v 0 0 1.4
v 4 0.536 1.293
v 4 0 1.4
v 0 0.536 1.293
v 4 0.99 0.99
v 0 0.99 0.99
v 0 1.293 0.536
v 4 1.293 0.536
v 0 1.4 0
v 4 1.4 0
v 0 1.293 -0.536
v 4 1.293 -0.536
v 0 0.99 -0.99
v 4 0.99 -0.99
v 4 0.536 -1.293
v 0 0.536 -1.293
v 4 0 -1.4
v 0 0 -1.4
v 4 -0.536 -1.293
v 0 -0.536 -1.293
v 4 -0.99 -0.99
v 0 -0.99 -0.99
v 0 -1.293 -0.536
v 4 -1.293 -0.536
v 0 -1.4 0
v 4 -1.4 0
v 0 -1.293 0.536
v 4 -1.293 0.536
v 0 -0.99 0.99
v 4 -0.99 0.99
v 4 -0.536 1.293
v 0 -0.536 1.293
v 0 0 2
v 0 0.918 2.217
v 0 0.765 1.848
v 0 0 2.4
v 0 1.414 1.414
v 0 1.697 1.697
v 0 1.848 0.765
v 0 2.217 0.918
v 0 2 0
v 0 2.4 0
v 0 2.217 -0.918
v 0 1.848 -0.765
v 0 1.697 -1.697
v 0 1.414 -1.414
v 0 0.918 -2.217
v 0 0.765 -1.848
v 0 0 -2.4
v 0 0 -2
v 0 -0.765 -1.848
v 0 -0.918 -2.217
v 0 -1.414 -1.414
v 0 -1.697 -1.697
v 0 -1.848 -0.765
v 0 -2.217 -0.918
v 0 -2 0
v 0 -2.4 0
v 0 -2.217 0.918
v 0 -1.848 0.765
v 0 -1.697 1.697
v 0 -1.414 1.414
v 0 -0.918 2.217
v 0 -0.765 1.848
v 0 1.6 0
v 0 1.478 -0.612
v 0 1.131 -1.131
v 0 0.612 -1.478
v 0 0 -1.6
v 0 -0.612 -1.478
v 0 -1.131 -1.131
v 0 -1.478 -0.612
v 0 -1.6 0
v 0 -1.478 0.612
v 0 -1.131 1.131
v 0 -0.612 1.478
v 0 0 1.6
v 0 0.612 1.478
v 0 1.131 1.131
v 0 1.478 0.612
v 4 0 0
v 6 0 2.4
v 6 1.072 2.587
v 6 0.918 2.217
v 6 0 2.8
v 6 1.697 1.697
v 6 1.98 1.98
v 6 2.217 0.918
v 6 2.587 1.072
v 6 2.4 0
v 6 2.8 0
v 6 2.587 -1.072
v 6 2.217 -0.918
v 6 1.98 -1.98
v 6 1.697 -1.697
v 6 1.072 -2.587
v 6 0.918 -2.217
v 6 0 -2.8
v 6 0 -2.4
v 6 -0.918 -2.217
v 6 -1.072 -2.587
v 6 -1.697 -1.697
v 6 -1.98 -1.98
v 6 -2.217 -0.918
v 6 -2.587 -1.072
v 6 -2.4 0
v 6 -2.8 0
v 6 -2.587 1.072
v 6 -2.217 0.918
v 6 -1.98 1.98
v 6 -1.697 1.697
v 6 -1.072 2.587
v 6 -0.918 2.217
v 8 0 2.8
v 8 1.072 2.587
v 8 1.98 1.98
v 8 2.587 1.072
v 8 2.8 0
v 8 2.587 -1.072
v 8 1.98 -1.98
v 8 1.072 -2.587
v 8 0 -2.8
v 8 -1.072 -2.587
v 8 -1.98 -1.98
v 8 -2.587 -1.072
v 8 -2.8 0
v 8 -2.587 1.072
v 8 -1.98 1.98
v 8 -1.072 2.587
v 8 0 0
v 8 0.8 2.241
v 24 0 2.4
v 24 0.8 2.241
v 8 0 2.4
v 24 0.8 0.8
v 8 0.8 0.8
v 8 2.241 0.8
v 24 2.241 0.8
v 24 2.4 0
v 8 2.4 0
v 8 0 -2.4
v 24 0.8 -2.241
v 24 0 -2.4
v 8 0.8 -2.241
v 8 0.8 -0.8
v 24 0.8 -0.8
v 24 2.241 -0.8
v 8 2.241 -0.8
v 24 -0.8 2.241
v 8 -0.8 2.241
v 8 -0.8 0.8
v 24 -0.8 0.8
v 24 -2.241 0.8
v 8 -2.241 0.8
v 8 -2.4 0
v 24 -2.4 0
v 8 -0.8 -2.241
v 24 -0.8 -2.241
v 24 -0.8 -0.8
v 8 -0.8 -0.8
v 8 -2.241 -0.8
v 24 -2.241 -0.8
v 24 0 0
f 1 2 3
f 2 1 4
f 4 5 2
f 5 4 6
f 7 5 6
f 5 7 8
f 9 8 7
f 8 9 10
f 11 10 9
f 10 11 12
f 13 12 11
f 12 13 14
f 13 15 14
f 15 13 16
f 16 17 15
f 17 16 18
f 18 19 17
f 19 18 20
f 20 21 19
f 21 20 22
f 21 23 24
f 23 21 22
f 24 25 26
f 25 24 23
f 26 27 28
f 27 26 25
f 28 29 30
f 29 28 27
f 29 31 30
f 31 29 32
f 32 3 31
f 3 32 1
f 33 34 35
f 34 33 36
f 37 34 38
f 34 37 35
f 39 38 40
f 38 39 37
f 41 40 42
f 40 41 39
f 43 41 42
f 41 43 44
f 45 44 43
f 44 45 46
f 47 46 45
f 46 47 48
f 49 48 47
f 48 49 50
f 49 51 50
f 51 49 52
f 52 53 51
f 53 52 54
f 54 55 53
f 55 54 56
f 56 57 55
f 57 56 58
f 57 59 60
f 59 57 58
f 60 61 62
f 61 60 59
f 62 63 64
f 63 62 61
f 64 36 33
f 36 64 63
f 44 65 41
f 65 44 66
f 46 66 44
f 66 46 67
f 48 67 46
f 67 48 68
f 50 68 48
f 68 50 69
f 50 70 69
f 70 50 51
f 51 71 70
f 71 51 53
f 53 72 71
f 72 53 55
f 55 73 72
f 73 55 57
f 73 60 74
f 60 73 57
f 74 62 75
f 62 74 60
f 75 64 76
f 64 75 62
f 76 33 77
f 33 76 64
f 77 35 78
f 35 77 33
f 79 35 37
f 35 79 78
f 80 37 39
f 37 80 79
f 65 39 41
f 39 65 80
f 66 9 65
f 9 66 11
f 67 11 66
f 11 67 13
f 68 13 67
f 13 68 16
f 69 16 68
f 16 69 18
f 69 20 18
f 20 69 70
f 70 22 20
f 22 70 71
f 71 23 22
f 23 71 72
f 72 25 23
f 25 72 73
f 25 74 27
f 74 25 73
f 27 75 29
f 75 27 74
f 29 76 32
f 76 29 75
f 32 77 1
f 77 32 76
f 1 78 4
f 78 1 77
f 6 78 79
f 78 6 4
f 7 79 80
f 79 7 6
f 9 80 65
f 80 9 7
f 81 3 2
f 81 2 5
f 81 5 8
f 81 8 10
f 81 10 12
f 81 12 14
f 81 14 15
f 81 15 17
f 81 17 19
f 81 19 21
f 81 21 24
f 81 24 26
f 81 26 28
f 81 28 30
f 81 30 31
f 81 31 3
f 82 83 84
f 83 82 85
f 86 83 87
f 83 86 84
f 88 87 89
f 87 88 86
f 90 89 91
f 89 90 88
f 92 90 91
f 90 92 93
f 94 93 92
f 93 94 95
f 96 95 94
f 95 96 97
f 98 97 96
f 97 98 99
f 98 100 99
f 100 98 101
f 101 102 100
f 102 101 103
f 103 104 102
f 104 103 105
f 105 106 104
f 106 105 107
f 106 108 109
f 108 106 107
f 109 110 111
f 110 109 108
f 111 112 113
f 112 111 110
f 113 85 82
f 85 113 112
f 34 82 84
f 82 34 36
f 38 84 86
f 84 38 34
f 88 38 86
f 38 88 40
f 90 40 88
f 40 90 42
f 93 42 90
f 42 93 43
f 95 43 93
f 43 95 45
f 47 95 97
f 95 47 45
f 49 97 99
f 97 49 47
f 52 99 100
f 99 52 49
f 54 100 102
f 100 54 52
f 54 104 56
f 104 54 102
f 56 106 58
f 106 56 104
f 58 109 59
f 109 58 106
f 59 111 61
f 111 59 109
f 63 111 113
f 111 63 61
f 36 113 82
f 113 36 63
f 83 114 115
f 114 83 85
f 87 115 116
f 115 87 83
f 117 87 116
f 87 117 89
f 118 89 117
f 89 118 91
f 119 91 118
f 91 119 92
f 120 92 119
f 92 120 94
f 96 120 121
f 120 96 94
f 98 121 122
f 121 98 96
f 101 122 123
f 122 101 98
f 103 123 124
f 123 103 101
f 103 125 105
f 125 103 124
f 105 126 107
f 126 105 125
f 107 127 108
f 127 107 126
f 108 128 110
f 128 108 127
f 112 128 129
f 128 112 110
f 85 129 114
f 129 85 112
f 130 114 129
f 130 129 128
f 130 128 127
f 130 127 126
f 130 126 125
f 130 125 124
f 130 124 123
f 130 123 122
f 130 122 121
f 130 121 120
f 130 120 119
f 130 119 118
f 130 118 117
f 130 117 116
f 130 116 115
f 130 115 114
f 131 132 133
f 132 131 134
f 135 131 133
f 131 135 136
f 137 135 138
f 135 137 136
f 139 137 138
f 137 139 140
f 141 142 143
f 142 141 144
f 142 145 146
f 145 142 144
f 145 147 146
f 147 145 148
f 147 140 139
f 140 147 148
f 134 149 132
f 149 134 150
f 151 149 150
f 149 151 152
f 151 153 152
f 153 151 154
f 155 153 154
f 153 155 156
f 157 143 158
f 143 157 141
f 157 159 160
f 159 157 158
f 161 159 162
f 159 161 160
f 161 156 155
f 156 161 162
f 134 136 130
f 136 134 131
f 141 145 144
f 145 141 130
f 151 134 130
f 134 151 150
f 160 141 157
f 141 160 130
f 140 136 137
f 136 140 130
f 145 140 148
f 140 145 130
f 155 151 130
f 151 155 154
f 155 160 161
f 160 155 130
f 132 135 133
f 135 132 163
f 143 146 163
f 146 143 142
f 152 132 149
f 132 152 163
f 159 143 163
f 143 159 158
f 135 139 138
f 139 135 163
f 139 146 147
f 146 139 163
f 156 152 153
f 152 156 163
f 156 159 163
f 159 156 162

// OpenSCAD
// file: ../p/axle.scad
use <../lib.scad>
function ldraw_lib__axle() = [
// 0 Axle
// 0 Name: axle.dat
// 0 Author: James Jessiman
// 0 !LDRAW_ORG Primitive UPDATE 2003-01
// 0 !LICENSE Licensed under CC BY 4.0 : see CAreadme.txt
// 
// 0 BFC CERTIFY CCW
  [0,"BFC","CERTIFY"],
  [0,"BFC","CCW"],
// 
// 0 !HISTORY 2000-04-23 [sbliss] Added conditional edges along outermost diameters
// 0 !HISTORY 2000-05-07 [PTadmin] Official Update 2000-01
// 0 !HISTORY 2002-11-08 [OrionP] Adjusted fit and precision
// 0 !HISTORY 2003-03-12 [PTadmin] Official Update 2003-01
// 0 !HISTORY 2007-06-24 [PTadmin] Header formatted for Contributor Agreement
// 0 !HISTORY 2008-07-01 [PTadmin] Official Update 2008-01
// 
// 
// 5 24 6 0 0 6 1 0 5.602 0 2 5.602 0 -2
  [5,24,6,0,0,6,1,0,5.602,0,2,5.602,0,-2],
// 5 24 0 0 6 0 1 6 2 0 5.602 -2 0 5.602
  [5,24,0,0,6,0,1,6,2,0,5.602,-2,0,5.602],
// 5 24 -6 0 0 -6 1 0 -5.602 0 -2 -5.602 0 2
  [5,24,-6,0,0,-6,1,0,-5.602,0,-2,-5.602,0,2],
// 5 24 0 0 -6 0 1 -6 -2 0 -5.602 2 0 -5.602
  [5,24,0,0,-6,0,1,-6,-2,0,-5.602,2,0,-5.602],
// 
// 2 24 6 0 0 5.602 0 2
  [2,24,6,0,0,5.602,0,2],
// 2 24 5.602 0 2 2 0 2
  [2,24,5.602,0,2,2,0,2],
// 2 24 2 0 2 2 0 5.602
  [2,24,2,0,2,2,0,5.602],
// 2 24 2 0 5.602 0 0 6
  [2,24,2,0,5.602,0,0,6],
// 2 24 -6 0 0 -5.602 0 2
  [2,24,-6,0,0,-5.602,0,2],
// 2 24 -5.602 0 2 -2 0 2
  [2,24,-5.602,0,2,-2,0,2],
// 2 24 -2 0 2 -2 0 5.602
  [2,24,-2,0,2,-2,0,5.602],
// 2 24 -2 0 5.602 -0 0 6
  [2,24,-2,0,5.602,-0,0,6],
// 2 24 6 0 -0 5.602 0 -2
  [2,24,6,0,-0,5.602,0,-2],
// 2 24 5.602 0 -2 2 0 -2
  [2,24,5.602,0,-2,2,0,-2],
// 2 24 2 0 -2 2 0 -5.602
  [2,24,2,0,-2,2,0,-5.602],
// 2 24 2 0 -5.602 0 0 -6
  [2,24,2,0,-5.602,0,0,-6],
// 2 24 -6 0 -0 -5.602 0 -2
  [2,24,-6,0,-0,-5.602,0,-2],
// 2 24 -5.602 0 -2 -2 0 -2
  [2,24,-5.602,0,-2,-2,0,-2],
// 2 24 -2 0 -2 -2 0 -5.602
  [2,24,-2,0,-2,-2,0,-5.602],
// 2 24 -2 0 -5.602 -0 0 -6
  [2,24,-2,0,-5.602,-0,0,-6],
// 2 24 6 1 0 5.602 1 2
  [2,24,6,1,0,5.602,1,2],
// 2 24 5.602 1 2 2 1 2
  [2,24,5.602,1,2,2,1,2],
// 2 24 2 1 2 2 1 5.602
  [2,24,2,1,2,2,1,5.602],
// 2 24 2 1 5.602 0 1 6
  [2,24,2,1,5.602,0,1,6],
// 2 24 -6 1 0 -5.602 1 2
  [2,24,-6,1,0,-5.602,1,2],
// 2 24 -5.602 1 2 -2 1 2
  [2,24,-5.602,1,2,-2,1,2],
// 2 24 -2 1 2 -2 1 5.602
  [2,24,-2,1,2,-2,1,5.602],
// 2 24 -2 1 5.602 -0 1 6
  [2,24,-2,1,5.602,-0,1,6],
// 2 24 6 1 -0 5.602 1 -2
  [2,24,6,1,-0,5.602,1,-2],
// 2 24 5.602 1 -2 2 1 -2
  [2,24,5.602,1,-2,2,1,-2],
// 2 24 2 1 -2 2 1 -5.602
  [2,24,2,1,-2,2,1,-5.602],
// 2 24 2 1 -5.602 0 1 -6
  [2,24,2,1,-5.602,0,1,-6],
// 2 24 -6 1 -0 -5.602 1 -2
  [2,24,-6,1,-0,-5.602,1,-2],
// 2 24 -5.602 1 -2 -2 1 -2
  [2,24,-5.602,1,-2,-2,1,-2],
// 2 24 -2 1 -2 -2 1 -5.602
  [2,24,-2,1,-2,-2,1,-5.602],
// 2 24 -2 1 -5.602 -0 1 -6
  [2,24,-2,1,-5.602,-0,1,-6],
// 
// 2 24 5.602 0 2 5.602 1 2
  [2,24,5.602,0,2,5.602,1,2],
// 2 24 2 0 2 2 1 2
  [2,24,2,0,2,2,1,2],
// 2 24 2 0 5.602 2 1 5.602
  [2,24,2,0,5.602,2,1,5.602],
// 2 24 -5.602 0 2 -5.602 1 2
  [2,24,-5.602,0,2,-5.602,1,2],
// 2 24 -2 0 2 -2 1 2
  [2,24,-2,0,2,-2,1,2],
// 2 24 -2 0 5.602 -2 1 5.602
  [2,24,-2,0,5.602,-2,1,5.602],
// 2 24 5.602 0 -2 5.602 1 -2
  [2,24,5.602,0,-2,5.602,1,-2],
// 2 24 2 0 -2 2 1 -2
  [2,24,2,0,-2,2,1,-2],
// 2 24 2 0 -5.602 2 1 -5.602
  [2,24,2,0,-5.602,2,1,-5.602],
// 2 24 -5.602 0 -2 -5.602 1 -2
  [2,24,-5.602,0,-2,-5.602,1,-2],
// 2 24 -2 0 -2 -2 1 -2
  [2,24,-2,0,-2,-2,1,-2],
// 2 24 -2 0 -5.602 -2 1 -5.602
  [2,24,-2,0,-5.602,-2,1,-5.602],
// 
// 4 16 6 0 0 6 1 0 5.602 1 2 5.602 0 2
  [4,16,6,0,0,6,1,0,5.602,1,2,5.602,0,2],
// 4 16 5.602 0 2 5.602 1 2 2 1 2 2 0 2
  [4,16,5.602,0,2,5.602,1,2,2,1,2,2,0,2],
// 4 16 2 0 2 2 1 2 2 1 5.602 2 0 5.602
  [4,16,2,0,2,2,1,2,2,1,5.602,2,0,5.602],
// 4 16 2 0 5.602 2 1 5.602 0 1 6 0 0 6
  [4,16,2,0,5.602,2,1,5.602,0,1,6,0,0,6],
// 4 16 -6 0 0 -5.602 0 2 -5.602 1 2 -6 1 0
  [4,16,-6,0,0,-5.602,0,2,-5.602,1,2,-6,1,0],
// 4 16 -5.602 0 2 -2 0 2 -2 1 2 -5.602 1 2
  [4,16,-5.602,0,2,-2,0,2,-2,1,2,-5.602,1,2],
// 4 16 -2 0 2 -2 0 5.602 -2 1 5.602 -2 1 2
  [4,16,-2,0,2,-2,0,5.602,-2,1,5.602,-2,1,2],
// 4 16 -2 0 5.602 -0 0 6 -0 1 6 -2 1 5.602
  [4,16,-2,0,5.602,-0,0,6,-0,1,6,-2,1,5.602],
// 4 16 6 0 -0 5.602 0 -2 5.602 1 -2 6 1 -0
  [4,16,6,0,-0,5.602,0,-2,5.602,1,-2,6,1,-0],
// 4 16 5.602 0 -2 2 0 -2 2 1 -2 5.602 1 -2
  [4,16,5.602,0,-2,2,0,-2,2,1,-2,5.602,1,-2],
// 4 16 2 0 -2 2 0 -5.602 2 1 -5.602 2 1 -2
  [4,16,2,0,-2,2,0,-5.602,2,1,-5.602,2,1,-2],
// 4 16 2 0 -5.602 0 0 -6 0 1 -6 2 1 -5.602
  [4,16,2,0,-5.602,0,0,-6,0,1,-6,2,1,-5.602],
// 4 16 -6 0 -0 -6 1 -0 -5.602 1 -2 -5.602 0 -2
  [4,16,-6,0,-0,-6,1,-0,-5.602,1,-2,-5.602,0,-2],
// 4 16 -5.602 0 -2 -5.602 1 -2 -2 1 -2 -2 0 -2
  [4,16,-5.602,0,-2,-5.602,1,-2,-2,1,-2,-2,0,-2],
// 4 16 -2 0 -2 -2 1 -2 -2 1 -5.602 -2 0 -5.602
  [4,16,-2,0,-2,-2,1,-2,-2,1,-5.602,-2,0,-5.602],
// 4 16 -2 0 -5.602 -2 1 -5.602 -0 1 -6 -0 0 -6
  [4,16,-2,0,-5.602,-2,1,-5.602,-0,1,-6,-0,0,-6],
// 
// 4 16 6 0 0 5.602 0 2 2 0 2 0 0 0
  [4,16,6,0,0,5.602,0,2,2,0,2,0,0,0],
// 4 16 -6 0 0 0 0 0 -2 0 2 -5.602 0 2
  [4,16,-6,0,0,0,0,0,-2,0,2,-5.602,0,2],
// 4 16 6 0 0 0 0 0 2 0 -2 5.602 0 -2
  [4,16,6,0,0,0,0,0,2,0,-2,5.602,0,-2],
// 4 16 -6 0 0 -5.602 0 -2 -2 0 -2 0 0 0
  [4,16,-6,0,0,-5.602,0,-2,-2,0,-2,0,0,0],
// 4 16 0 0 6 0 0 0 2 0 2 2 0 5.602
  [4,16,0,0,6,0,0,0,2,0,2,2,0,5.602],
// 4 16 0 0 6 -2 0 5.602 -2 0 2 0 0 0
  [4,16,0,0,6,-2,0,5.602,-2,0,2,0,0,0],
// 4 16 0 0 -6 2 0 -5.602 2 0 -2 0 0 0
  [4,16,0,0,-6,2,0,-5.602,2,0,-2,0,0,0],
// 4 16 0 0 -6 0 0 0 -2 0 -2 -2 0 -5.602
  [4,16,0,0,-6,0,0,0,-2,0,-2,-2,0,-5.602],
// 4 16 6 1 0 0 1 0 2 1 2 5.602 1 2
  [4,16,6,1,0,0,1,0,2,1,2,5.602,1,2],
// 4 16 -6 1 0 -5.602 1 2 -2 1 2 0 1 0
  [4,16,-6,1,0,-5.602,1,2,-2,1,2,0,1,0],
// 4 16 6 1 0 5.602 1 -2 2 1 -2 0 1 0
  [4,16,6,1,0,5.602,1,-2,2,1,-2,0,1,0],
// 4 16 -6 1 0 0 1 0 -2 1 -2 -5.602 1 -2
  [4,16,-6,1,0,0,1,0,-2,1,-2,-5.602,1,-2],
// 4 16 0 1 6 2 1 5.602 2 1 2 0 1 0
  [4,16,0,1,6,2,1,5.602,2,1,2,0,1,0],
// 4 16 0 1 6 0 1 0 -2 1 2 -2 1 5.602
  [4,16,0,1,6,0,1,0,-2,1,2,-2,1,5.602],
// 4 16 0 1 -6 0 1 0 2 1 -2 2 1 -5.602
  [4,16,0,1,-6,0,1,0,2,1,-2,2,1,-5.602],
// 4 16 0 1 -6 -2 1 -5.602 -2 1 -2 0 1 0
  [4,16,0,1,-6,-2,1,-5.602,-2,1,-2,0,1,0],
// 0
];
module ldraw_lib__axle(step=0, col=false, unit=2/5, alt=false, line=0.2, solid=!$preview)
    makepoly(ldraw_lib__axle(), step=step, col=col, unit=unit, alt=alt, line=line, solid=solid);
ldraw_lib__axle(line=0.2);
// file: ../p/4-4ring7.scad
use <../lib.scad>
function ldraw_lib__4_4ring7() = [
// 0 Ring  7 x 1.0
// 0 Name: 4-4ring7.dat
// 0 Author: James Jessiman
// 0 !LDRAW_ORG Primitive UPDATE 2009-01
// 0 !LICENSE Licensed under CC BY 2.0 and CC BY 4.0 : see CAreadme.txt
// 
// 0 BFC CERTIFY CCW
  [0,"BFC","CERTIFY"],
  [0,"BFC","CCW"],
// 
// 0 !HISTORY 1998-12-15 [PTadmin] Official Update 1998-10
// 0 !HISTORY 2002-04-05 [hafhead] Added BFC statement
// 0 !HISTORY 2002-04-25 [PTadmin] Official Update 2002-02
// 0 !HISTORY 2007-06-24 [PTadmin] Header formatted for Contributor Agreement
// 0 !HISTORY 2008-07-01 [PTadmin] Official Update 2008-01
// 0 !HISTORY 2008-08-26 [cwdee] Switch polygon winding and rename
// 0 !HISTORY 2009-05-02 [PTadmin] Official Update 2009-01
// 
// 
// 4 16 -3.0616 0 7.3912 -2.6789 0 6.4673 0 0 7 0 0 8
  [4,16,-3.0616,0,7.3912,-2.6789,0,6.4673,0,0,7,0,0,8],
// 4 16 -5.6568 0 5.6568 -4.9497 0 4.9497 -2.6789 0 6.4673 -3.0616 0 7.3912
  [4,16,-5.6568,0,5.6568,-4.9497,0,4.9497,-2.6789,0,6.4673,-3.0616,0,7.3912],
// 4 16 -7.3912 0 3.0616 -6.4673 0 2.6789 -4.9497 0 4.9497 -5.6568 0 5.6568
  [4,16,-7.3912,0,3.0616,-6.4673,0,2.6789,-4.9497,0,4.9497,-5.6568,0,5.6568],
// 4 16 -8 0 0 -7 0 0 -6.4673 0 2.6789 -7.3912 0 3.0616
  [4,16,-8,0,0,-7,0,0,-6.4673,0,2.6789,-7.3912,0,3.0616],
// 4 16 -7.3912 0 -3.0616 -6.4673 0 -2.6789 -7 0 0 -8 0 0
  [4,16,-7.3912,0,-3.0616,-6.4673,0,-2.6789,-7,0,0,-8,0,0],
// 4 16 -5.6568 0 -5.6568 -4.9497 0 -4.9497 -6.4673 0 -2.6789 -7.3912 0 -3.0616
  [4,16,-5.6568,0,-5.6568,-4.9497,0,-4.9497,-6.4673,0,-2.6789,-7.3912,0,-3.0616],
// 4 16 -3.0616 0 -7.3912 -2.6789 0 -6.4673 -4.9497 0 -4.9497 -5.6568 0 -5.6568
  [4,16,-3.0616,0,-7.3912,-2.6789,0,-6.4673,-4.9497,0,-4.9497,-5.6568,0,-5.6568],
// 4 16 0 0 -8 0 0 -7 -2.6789 0 -6.4673 -3.0616 0 -7.3912
  [4,16,0,0,-8,0,0,-7,-2.6789,0,-6.4673,-3.0616,0,-7.3912],
// 4 16 3.0616 0 -7.3912 2.6789 0 -6.4673 0 0 -7 0 0 -8
  [4,16,3.0616,0,-7.3912,2.6789,0,-6.4673,0,0,-7,0,0,-8],
// 4 16 5.6568 0 -5.6568 4.9497 0 -4.9497 2.6789 0 -6.4673 3.0616 0 -7.3912
  [4,16,5.6568,0,-5.6568,4.9497,0,-4.9497,2.6789,0,-6.4673,3.0616,0,-7.3912],
// 4 16 7.3912 0 -3.0616 6.4673 0 -2.6789 4.9497 0 -4.9497 5.6568 0 -5.6568
  [4,16,7.3912,0,-3.0616,6.4673,0,-2.6789,4.9497,0,-4.9497,5.6568,0,-5.6568],
// 4 16 8 0 0 7 0 0 6.4673 0 -2.6789 7.3912 0 -3.0616
  [4,16,8,0,0,7,0,0,6.4673,0,-2.6789,7.3912,0,-3.0616],
// 4 16 7.3912 0 3.0616 6.4673 0 2.6789 7 0 0 8 0 0
  [4,16,7.3912,0,3.0616,6.4673,0,2.6789,7,0,0,8,0,0],
// 4 16 5.6568 0 5.6568 4.9497 0 4.9497 6.4673 0 2.6789 7.3912 0 3.0616
  [4,16,5.6568,0,5.6568,4.9497,0,4.9497,6.4673,0,2.6789,7.3912,0,3.0616],
// 4 16 3.0616 0 7.3912 2.6789 0 6.4673 4.9497 0 4.9497 5.6568 0 5.6568
  [4,16,3.0616,0,7.3912,2.6789,0,6.4673,4.9497,0,4.9497,5.6568,0,5.6568],
// 4 16 0 0 8 0 0 7 2.6789 0 6.4673 3.0616 0 7.3912
  [4,16,0,0,8,0,0,7,2.6789,0,6.4673,3.0616,0,7.3912],
// 0
];
module ldraw_lib__4_4ring7(step=0, col=false, unit=2/5, alt=false, line=0.2, solid=!$preview)
    makepoly(ldraw_lib__4_4ring7(), step=step, col=col, unit=unit, alt=alt, line=line, solid=solid);
ldraw_lib__4_4ring7(line=0.2);
// file: ../p/4-4ring6.scad
use <../lib.scad>
function ldraw_lib__4_4ring6() = [
// 0 Ring  6 x 1.0
// 0 Name: 4-4ring6.dat
// 0 Author: Mark Kennedy [mkennedy]
// 0 !LDRAW_ORG Primitive UPDATE 2012-01
// 0 !LICENSE Licensed under CC BY 4.0 : see CAreadme.txt
// 
// 0 BFC CERTIFY CCW
  [0,"BFC","CERTIFY"],
  [0,"BFC","CCW"],
// 
// 0 !HISTORY 2001-10-23 [pneaster] resequenced quads, corrected winding.
// 0 !HISTORY 2001-11-30 [PTadmin] Official Update 2001-02
// 0 !HISTORY 2007-06-24 [PTadmin] Header formatted for Contributor Agreement
// 0 !HISTORY 2008-07-01 [PTadmin] Official Update 2008-01
// 0 !HISTORY 2012-02-16 [Philo] Changed to CCW
// 0 !HISTORY 2012-03-30 [PTadmin] Official Update 2012-01
// 
// 
// 4 16 7 0 0 6.4672 0 2.6788 5.5433 0 2.2961 6 0 0
  [4,16,7,0,0,6.4672,0,2.6788,5.5433,0,2.2961,6,0,0],
// 4 16 6.4672 0 2.6788 4.9497 0 4.9497 4.2426 0 4.2426 5.5433 0 2.2961
  [4,16,6.4672,0,2.6788,4.9497,0,4.9497,4.2426,0,4.2426,5.5433,0,2.2961],
// 4 16 4.9497 0 4.9497 2.6788 0 6.4672 2.2961 0 5.5433 4.2426 0 4.2426
  [4,16,4.9497,0,4.9497,2.6788,0,6.4672,2.2961,0,5.5433,4.2426,0,4.2426],
// 4 16 2.6788 0 6.4672 0 0 7 0 0 6 2.2961 0 5.5433
  [4,16,2.6788,0,6.4672,0,0,7,0,0,6,2.2961,0,5.5433],
// 4 16 0 0 7 -2.6788 0 6.4672 -2.2961 0 5.5433 0 0 6
  [4,16,0,0,7,-2.6788,0,6.4672,-2.2961,0,5.5433,0,0,6],
// 4 16 -2.6788 0 6.4672 -4.9497 0 4.9497 -4.2426 0 4.2426 -2.2961 0 5.5433
  [4,16,-2.6788,0,6.4672,-4.9497,0,4.9497,-4.2426,0,4.2426,-2.2961,0,5.5433],
// 4 16 -4.9497 0 4.9497 -6.4672 0 2.6788 -5.5433 0 2.2961 -4.2426 0 4.2426
  [4,16,-4.9497,0,4.9497,-6.4672,0,2.6788,-5.5433,0,2.2961,-4.2426,0,4.2426],
// 4 16 -6.4672 0 2.6788 -7 0 0 -6 0 0 -5.5433 0 2.2961
  [4,16,-6.4672,0,2.6788,-7,0,0,-6,0,0,-5.5433,0,2.2961],
// 4 16 -7 0 0 -6.4672 0 -2.6788 -5.5433 0 -2.2961 -6 0 0
  [4,16,-7,0,0,-6.4672,0,-2.6788,-5.5433,0,-2.2961,-6,0,0],
// 4 16 -6.4672 0 -2.6788 -4.9497 0 -4.9497 -4.2426 0 -4.2426 -5.5433 0 -2.2961
  [4,16,-6.4672,0,-2.6788,-4.9497,0,-4.9497,-4.2426,0,-4.2426,-5.5433,0,-2.2961],
// 4 16 -4.9497 0 -4.9497 -2.6788 0 -6.4672 -2.2961 0 -5.5433 -4.2426 0 -4.2426
  [4,16,-4.9497,0,-4.9497,-2.6788,0,-6.4672,-2.2961,0,-5.5433,-4.2426,0,-4.2426],
// 4 16 -2.6788 0 -6.4672 0 0 -7 0 0 -6 -2.2961 0 -5.5433
  [4,16,-2.6788,0,-6.4672,0,0,-7,0,0,-6,-2.2961,0,-5.5433],
// 4 16 0 0 -7 2.6788 0 -6.4672 2.2961 0 -5.5433 0 0 -6
  [4,16,0,0,-7,2.6788,0,-6.4672,2.2961,0,-5.5433,0,0,-6],
// 4 16 2.6788 0 -6.4672 4.9497 0 -4.9497 4.2426 0 -4.2426 2.2961 0 -5.5433
  [4,16,2.6788,0,-6.4672,4.9497,0,-4.9497,4.2426,0,-4.2426,2.2961,0,-5.5433],
// 4 16 4.9497 0 -4.9497 6.4672 0 -2.6788 5.5433 0 -2.2961 4.2426 0 -4.2426
  [4,16,4.9497,0,-4.9497,6.4672,0,-2.6788,5.5433,0,-2.2961,4.2426,0,-4.2426],
// 4 16 6.4672 0 -2.6788 7 0 0 6 0 0 5.5433 0 -2.2961
  [4,16,6.4672,0,-2.6788,7,0,0,6,0,0,5.5433,0,-2.2961],
];
module ldraw_lib__4_4ring6(step=0, col=false, unit=2/5, alt=false, line=0.2, solid=!$preview)
    makepoly(ldraw_lib__4_4ring6(), step=step, col=col, unit=unit, alt=alt, line=line, solid=solid);
ldraw_lib__4_4ring6(line=0.2);
// file: ../p/4-4ring5.scad
use <../lib.scad>
function ldraw_lib__4_4ring5() = [
// 0 Ring  5 x 1.0
// 0 Name: 4-4ring5.dat
// 0 Author: Mark Kennedy [mkennedy]
// 0 !LDRAW_ORG Primitive UPDATE 2012-01
// 0 !LICENSE Licensed under CC BY 4.0 : see CAreadme.txt
// 
// 0 BFC CERTIFY CCW
  [0,"BFC","CERTIFY"],
  [0,"BFC","CCW"],
// 
// 0 !HISTORY 2001-10-23 [pneaster] resequenced quads, corrected winding.
// 0 !HISTORY 2001-12-29 [pneaster] Added BFC.
// 0 !HISTORY 2002-04-25 [PTadmin] Official Update 2002-02
// 0 !HISTORY 2007-06-24 [PTadmin] Header formatted for Contributor Agreement
// 0 !HISTORY 2008-07-01 [PTadmin] Official Update 2008-01
// 0 !HISTORY 2012-02-16 [Philo] Changed to CCW
// 0 !HISTORY 2012-03-30 [PTadmin] Official Update 2012-01
// 
// 
// 4 16 6 0 0 5.5433 0 2.2961 4.6195 0 1.9135 5 0 0
  [4,16,6,0,0,5.5433,0,2.2961,4.6195,0,1.9135,5,0,0],
// 4 16 5.5433 0 2.2961 4.2426 0 4.2426 3.5355 0 3.5355 4.6195 0 1.9135
  [4,16,5.5433,0,2.2961,4.2426,0,4.2426,3.5355,0,3.5355,4.6195,0,1.9135],
// 4 16 4.2426 0 4.2426 2.2961 0 5.5433 1.9135 0 4.6195 3.5355 0 3.5355
  [4,16,4.2426,0,4.2426,2.2961,0,5.5433,1.9135,0,4.6195,3.5355,0,3.5355],
// 4 16 2.2961 0 5.5433 0 0 6 0 0 5 1.9135 0 4.6195
  [4,16,2.2961,0,5.5433,0,0,6,0,0,5,1.9135,0,4.6195],
// 4 16 0 0 6 -2.2961 0 5.5433 -1.9135 0 4.6195 0 0 5
  [4,16,0,0,6,-2.2961,0,5.5433,-1.9135,0,4.6195,0,0,5],
// 4 16 -2.2961 0 5.5433 -4.2426 0 4.2426 -3.5355 0 3.5355 -1.9135 0 4.6195
  [4,16,-2.2961,0,5.5433,-4.2426,0,4.2426,-3.5355,0,3.5355,-1.9135,0,4.6195],
// 4 16 -4.2426 0 4.2426 -5.5433 0 2.2961 -4.6195 0 1.9135 -3.5355 0 3.5355
  [4,16,-4.2426,0,4.2426,-5.5433,0,2.2961,-4.6195,0,1.9135,-3.5355,0,3.5355],
// 4 16 -5.5433 0 2.2961 -6 0 0 -5 0 0 -4.6195 0 1.9135
  [4,16,-5.5433,0,2.2961,-6,0,0,-5,0,0,-4.6195,0,1.9135],
// 4 16 -6 0 0 -5.5433 0 -2.2961 -4.6195 0 -1.9135 -5 0 0
  [4,16,-6,0,0,-5.5433,0,-2.2961,-4.6195,0,-1.9135,-5,0,0],
// 4 16 -5.5433 0 -2.2961 -4.2426 0 -4.2426 -3.5355 0 -3.5355 -4.6195 0 -1.9135
  [4,16,-5.5433,0,-2.2961,-4.2426,0,-4.2426,-3.5355,0,-3.5355,-4.6195,0,-1.9135],
// 4 16 -4.2426 0 -4.2426 -2.2961 0 -5.5433 -1.9135 0 -4.6195 -3.5355 0 -3.5355
  [4,16,-4.2426,0,-4.2426,-2.2961,0,-5.5433,-1.9135,0,-4.6195,-3.5355,0,-3.5355],
// 4 16 -2.2961 0 -5.5433 0 0 -6 0 0 -5 -1.9135 0 -4.6195
  [4,16,-2.2961,0,-5.5433,0,0,-6,0,0,-5,-1.9135,0,-4.6195],
// 4 16 0 0 -6 2.2961 0 -5.5433 1.9135 0 -4.6195 0 0 -5
  [4,16,0,0,-6,2.2961,0,-5.5433,1.9135,0,-4.6195,0,0,-5],
// 4 16 2.2961 0 -5.5433 4.2426 0 -4.2426 3.5355 0 -3.5355 1.9135 0 -4.6195
  [4,16,2.2961,0,-5.5433,4.2426,0,-4.2426,3.5355,0,-3.5355,1.9135,0,-4.6195],
// 4 16 4.2426 0 -4.2426 5.5433 0 -2.2961 4.6195 0 -1.9135 3.5355 0 -3.5355
  [4,16,4.2426,0,-4.2426,5.5433,0,-2.2961,4.6195,0,-1.9135,3.5355,0,-3.5355],
// 4 16 5.5433 0 -2.2961 6 0 0 5 0 0 4.6195 0 -1.9135
  [4,16,5.5433,0,-2.2961,6,0,0,5,0,0,4.6195,0,-1.9135],
];
module ldraw_lib__4_4ring5(step=0, col=false, unit=2/5, alt=false, line=0.2, solid=!$preview)
    makepoly(ldraw_lib__4_4ring5(), step=step, col=col, unit=unit, alt=alt, line=line, solid=solid);
ldraw_lib__4_4ring5(line=0.2);
// file: ../p/4-4ring4.scad
use <../lib.scad>
function ldraw_lib__4_4ring4() = [
// 0 Ring  4 x 1.0
// 0 Name: 4-4ring4.dat
// 0 Author: James Jessiman
// 0 !LDRAW_ORG Primitive UPDATE 2009-01
// 0 !LICENSE Licensed under CC BY 2.0 and CC BY 4.0 : see CAreadme.txt
// 
// 0 BFC CERTIFY CCW
  [0,"BFC","CERTIFY"],
  [0,"BFC","CCW"],
// 
// 0 !HISTORY 1998-12-15 [PTadmin] Official Update 1998-10
// 0 !HISTORY 2002-04-08 [BrickCaster] Modified for BFC compliance
// 0 !HISTORY 2002-04-25 [PTadmin] Official Update 2002-02
// 0 !HISTORY 2007-06-24 [PTadmin] Header formatted for Contributor Agreement
// 0 !HISTORY 2008-07-01 [PTadmin] Official Update 2008-01
// 0 !HISTORY 2008-08-26 [cwdee] Switch polygon winding and rename
// 0 !HISTORY 2009-05-02 [PTadmin] Official Update 2009-01
// 
// 
// 4 16 -1.9135 0 4.6195 -1.5308 0 3.6956 0 0 4 0 0 5
  [4,16,-1.9135,0,4.6195,-1.5308,0,3.6956,0,0,4,0,0,5],
// 4 16 -3.5355 0 3.5355 -2.8284 0 2.8284 -1.5308 0 3.6956 -1.9135 0 4.6195
  [4,16,-3.5355,0,3.5355,-2.8284,0,2.8284,-1.5308,0,3.6956,-1.9135,0,4.6195],
// 4 16 -4.6195 0 1.9135 -3.6956 0 1.5308 -2.8284 0 2.8284 -3.5355 0 3.5355
  [4,16,-4.6195,0,1.9135,-3.6956,0,1.5308,-2.8284,0,2.8284,-3.5355,0,3.5355],
// 4 16 -5 0 0 -4 0 0 -3.6956 0 1.5308 -4.6195 0 1.9135
  [4,16,-5,0,0,-4,0,0,-3.6956,0,1.5308,-4.6195,0,1.9135],
// 4 16 -4.6195 0 -1.9135 -3.6956 0 -1.5308 -4 0 0 -5 0 0
  [4,16,-4.6195,0,-1.9135,-3.6956,0,-1.5308,-4,0,0,-5,0,0],
// 4 16 -3.5355 0 -3.5355 -2.8284 0 -2.8284 -3.6956 0 -1.5308 -4.6195 0 -1.9135
  [4,16,-3.5355,0,-3.5355,-2.8284,0,-2.8284,-3.6956,0,-1.5308,-4.6195,0,-1.9135],
// 4 16 -1.9135 0 -4.6195 -1.5308 0 -3.6956 -2.8284 0 -2.8284 -3.5355 0 -3.5355
  [4,16,-1.9135,0,-4.6195,-1.5308,0,-3.6956,-2.8284,0,-2.8284,-3.5355,0,-3.5355],
// 4 16 0 0 -5 0 0 -4 -1.5308 0 -3.6956 -1.9135 0 -4.6195
  [4,16,0,0,-5,0,0,-4,-1.5308,0,-3.6956,-1.9135,0,-4.6195],
// 4 16 1.9135 0 -4.6195 1.5308 0 -3.6956 0 0 -4 0 0 -5
  [4,16,1.9135,0,-4.6195,1.5308,0,-3.6956,0,0,-4,0,0,-5],
// 4 16 3.5355 0 -3.5355 2.8284 0 -2.8284 1.5308 0 -3.6956 1.9135 0 -4.6195
  [4,16,3.5355,0,-3.5355,2.8284,0,-2.8284,1.5308,0,-3.6956,1.9135,0,-4.6195],
// 4 16 4.6195 0 -1.9135 3.6956 0 -1.5308 2.8284 0 -2.8284 3.5355 0 -3.5355
  [4,16,4.6195,0,-1.9135,3.6956,0,-1.5308,2.8284,0,-2.8284,3.5355,0,-3.5355],
// 4 16 5 0 0 4 0 0 3.6956 0 -1.5308 4.6195 0 -1.9135
  [4,16,5,0,0,4,0,0,3.6956,0,-1.5308,4.6195,0,-1.9135],
// 4 16 4.6195 0 1.9135 3.6956 0 1.5308 4 0 0 5 0 0
  [4,16,4.6195,0,1.9135,3.6956,0,1.5308,4,0,0,5,0,0],
// 4 16 3.5355 0 3.5355 2.8284 0 2.8284 3.6956 0 1.5308 4.6195 0 1.9135
  [4,16,3.5355,0,3.5355,2.8284,0,2.8284,3.6956,0,1.5308,4.6195,0,1.9135],
// 4 16 1.9135 0 4.6195 1.5308 0 3.6956 2.8284 0 2.8284 3.5355 0 3.5355
  [4,16,1.9135,0,4.6195,1.5308,0,3.6956,2.8284,0,2.8284,3.5355,0,3.5355],
// 4 16 0 0 5 0 0 4 1.5308 0 3.6956 1.9135 0 4.6195
  [4,16,0,0,5,0,0,4,1.5308,0,3.6956,1.9135,0,4.6195],
// 0
];
module ldraw_lib__4_4ring4(step=0, col=false, unit=2/5, alt=false, line=0.2, solid=!$preview)
    makepoly(ldraw_lib__4_4ring4(), step=step, col=col, unit=unit, alt=alt, line=line, solid=solid);
ldraw_lib__4_4ring4(line=0.2);
// file: ../p/4-4edge.scad
use <../lib.scad>
function ldraw_lib__4_4edge() = [
// 0 Circle 1.0
// 0 Name: 4-4edge.dat
// 0 Author: James Jessiman
// 0 !LDRAW_ORG Primitive UPDATE 2017-01
// 0 !LICENSE Licensed under CC BY 4.0 : see CAreadme.txt
// 
// 0 BFC CERTIFY CCW
  [0,"BFC","CERTIFY"],
  [0,"BFC","CCW"],
// 
// 0 !HISTORY 1998-12-15 [PTadmin] Official Update 1998-10
// 0 !HISTORY 2005-12-28 [PTadmin] Official Update 2005-01
// 0 !HISTORY 2007-06-24 [PTadmin] Header formatted for Contributor Agreement
// 0 !HISTORY 2008-07-01 [PTadmin] Official Update 2008-01
// 0 !HISTORY 2017-01-15 [Steffen] BFCed
// 0 !HISTORY 2017-12-30 [PTadmin] Official Update 2017-01
// 
// 
// 2 24 1 0 0 0.9239 0 0.3827
  [2,24,1,0,0,0.9239,0,0.3827],
// 2 24 0.9239 0 0.3827 0.7071 0 0.7071
  [2,24,0.9239,0,0.3827,0.7071,0,0.7071],
// 2 24 0.7071 0 0.7071 0.3827 0 0.9239
  [2,24,0.7071,0,0.7071,0.3827,0,0.9239],
// 2 24 0.3827 0 0.9239 0 0 1
  [2,24,0.3827,0,0.9239,0,0,1],
// 2 24 0 0 1 -0.3827 0 0.9239
  [2,24,0,0,1,-0.3827,0,0.9239],
// 2 24 -0.3827 0 0.9239 -0.7071 0 0.7071
  [2,24,-0.3827,0,0.9239,-0.7071,0,0.7071],
// 2 24 -0.7071 0 0.7071 -0.9239 0 0.3827
  [2,24,-0.7071,0,0.7071,-0.9239,0,0.3827],
// 2 24 -0.9239 0 0.3827 -1 0 -0
  [2,24,-0.9239,0,0.3827,-1,0,-0],
// 2 24 -1 0 -0 -0.9239 0 -0.3827
  [2,24,-1,0,-0,-0.9239,0,-0.3827],
// 2 24 -0.9239 0 -0.3827 -0.7071 0 -0.7071
  [2,24,-0.9239,0,-0.3827,-0.7071,0,-0.7071],
// 2 24 -0.7071 0 -0.7071 -0.3827 0 -0.9239
  [2,24,-0.7071,0,-0.7071,-0.3827,0,-0.9239],
// 2 24 -0.3827 0 -0.9239 0 0 -1
  [2,24,-0.3827,0,-0.9239,0,0,-1],
// 2 24 0 0 -1 0.3827 0 -0.9239
  [2,24,0,0,-1,0.3827,0,-0.9239],
// 2 24 0.3827 0 -0.9239 0.7071 0 -0.7071
  [2,24,0.3827,0,-0.9239,0.7071,0,-0.7071],
// 2 24 0.7071 0 -0.7071 0.9239 0 -0.3827
  [2,24,0.7071,0,-0.7071,0.9239,0,-0.3827],
// 2 24 0.9239 0 -0.3827 1 0 0
  [2,24,0.9239,0,-0.3827,1,0,0],
];
module ldraw_lib__4_4edge(step=0, col=false, unit=2/5, alt=false, line=0.2, solid=!$preview)
    makepoly(ldraw_lib__4_4edge(), step=step, col=col, unit=unit, alt=alt, line=line, solid=solid);
ldraw_lib__4_4edge(line=0.2);
// file: ../p/4-4disc.scad
use <../lib.scad>
function ldraw_lib__4_4disc() = [
// 0 Disc 1.0
// 0 Name: 4-4disc.dat
// 0 Author: James Jessiman
// 0 !LDRAW_ORG Primitive UPDATE 2002-02
// 0 !LICENSE Licensed under CC BY 4.0 : see CAreadme.txt
// 
// 0 BFC CERTIFY CCW
  [0,"BFC","CERTIFY"],
  [0,"BFC","CCW"],
// 
// 0 !HISTORY 1998-12-15 [PTadmin] Official Update 1998-10
// 0 !HISTORY 2002-03-23 [sbliss] Added BFC statement
// 0 !HISTORY 2002-04-25 [PTadmin] Official Update 2002-02
// 0 !HISTORY 2007-06-24 [PTadmin] Header formatted for Contributor Agreement
// 0 !HISTORY 2008-07-01 [PTadmin] Official Update 2008-01
// 
// 
// 3 16 0 0 0 1 0 0 0.9239 0 0.3827
  [3,16,0,0,0,1,0,0,0.9239,0,0.3827],
// 3 16 0 0 0 0.9239 0 0.3827 0.7071 0 0.7071
  [3,16,0,0,0,0.9239,0,0.3827,0.7071,0,0.7071],
// 3 16 0 0 0 0.7071 0 0.7071 0.3827 0 0.9239
  [3,16,0,0,0,0.7071,0,0.7071,0.3827,0,0.9239],
// 3 16 0 0 0 0.3827 0 0.9239 0 0 1
  [3,16,0,0,0,0.3827,0,0.9239,0,0,1],
// 3 16 0 0 0 0 0 1 -0.3827 0 0.9239
  [3,16,0,0,0,0,0,1,-0.3827,0,0.9239],
// 3 16 0 0 0 -0.3827 0 0.9239 -0.7071 0 0.7071
  [3,16,0,0,0,-0.3827,0,0.9239,-0.7071,0,0.7071],
// 3 16 0 0 0 -0.7071 0 0.7071 -0.9239 0 0.3827
  [3,16,0,0,0,-0.7071,0,0.7071,-0.9239,0,0.3827],
// 3 16 0 0 0 -0.9239 0 0.3827 -1 0 -0
  [3,16,0,0,0,-0.9239,0,0.3827,-1,0,-0],
// 3 16 0 0 0 -1 0 -0 -0.9239 0 -0.3827
  [3,16,0,0,0,-1,0,-0,-0.9239,0,-0.3827],
// 3 16 0 0 0 -0.9239 0 -0.3827 -0.7071 0 -0.7071
  [3,16,0,0,0,-0.9239,0,-0.3827,-0.7071,0,-0.7071],
// 3 16 0 0 0 -0.7071 0 -0.7071 -0.3827 0 -0.9239
  [3,16,0,0,0,-0.7071,0,-0.7071,-0.3827,0,-0.9239],
// 3 16 0 0 0 -0.3827 0 -0.9239 0 0 -1
  [3,16,0,0,0,-0.3827,0,-0.9239,0,0,-1],
// 3 16 0 0 0 0 0 -1 0.3827 0 -0.9239
  [3,16,0,0,0,0,0,-1,0.3827,0,-0.9239],
// 3 16 0 0 0 0.3827 0 -0.9239 0.7071 0 -0.7071
  [3,16,0,0,0,0.3827,0,-0.9239,0.7071,0,-0.7071],
// 3 16 0 0 0 0.7071 0 -0.7071 0.9239 0 -0.3827
  [3,16,0,0,0,0.7071,0,-0.7071,0.9239,0,-0.3827],
// 3 16 0 0 0 0.9239 0 -0.3827 1 0 0
  [3,16,0,0,0,0.9239,0,-0.3827,1,0,0],
// 0
];
module ldraw_lib__4_4disc(step=0, col=false, unit=2/5, alt=false, line=0.2, solid=!$preview)
    makepoly(ldraw_lib__4_4disc(), step=step, col=col, unit=unit, alt=alt, line=line, solid=solid);
ldraw_lib__4_4disc(line=0.2);
// file: ../p/4-4cyli.scad
use <../lib.scad>
function ldraw_lib__4_4cyli() = [
// 0 Cylinder 1.0
// 0 Name: 4-4cyli.dat
// 0 Author: James Jessiman
// 0 !LDRAW_ORG Primitive UPDATE 2005-01
// 0 !LICENSE Licensed under CC BY 2.0 and CC BY 4.0 : see CAreadme.txt
// 
// 0 BFC CERTIFY CCW
  [0,"BFC","CERTIFY"],
  [0,"BFC","CCW"],
// 
// 0 !HISTORY 1998-12-15 [PTadmin] Official Update 1998-10
// 0 !HISTORY 2002-03-23 [sbliss] Added BFC statement; merged headers from files in distributions LDraw 0.27 and Complete.
// 0 !HISTORY 2002-04-25 [PTadmin] Official Update 2002-02
// 0 !HISTORY 2004-12-14 [guyvivan] BFC CCW
// 0 !HISTORY 2005-12-28 [PTadmin] Official Update 2005-01
// 0 !HISTORY 2007-06-24 [PTadmin] Header formatted for Contributor Agreement
// 0 !HISTORY 2008-07-01 [PTadmin] Official Update 2008-01
// 
// 
// 4 16 1 1 0 0.9239 1 0.3827 0.9239 0 0.3827 1 0 0
  [4,16,1,1,0,0.9239,1,0.3827,0.9239,0,0.3827,1,0,0],
// 5 24 1 0 0 1 1 0 0.9239 0 0.3827 0.9239 0 -0.3827
  [5,24,1,0,0,1,1,0,0.9239,0,0.3827,0.9239,0,-0.3827],
// 4 16 0.9239 1 0.3827 0.7071 1 0.7071 0.7071 0 0.7071 0.9239 0 0.3827
  [4,16,0.9239,1,0.3827,0.7071,1,0.7071,0.7071,0,0.7071,0.9239,0,0.3827],
// 5 24 0.9239 0 0.3827 0.9239 1 0.3827 0.7071 0 0.7071 1 0 0
  [5,24,0.9239,0,0.3827,0.9239,1,0.3827,0.7071,0,0.7071,1,0,0],
// 4 16 0.7071 1 0.7071 0.3827 1 0.9239 0.3827 0 0.9239 0.7071 0 0.7071
  [4,16,0.7071,1,0.7071,0.3827,1,0.9239,0.3827,0,0.9239,0.7071,0,0.7071],
// 5 24 0.7071 0 0.7071 0.7071 1 0.7071 0.3827 0 0.9239 0.9239 0 0.3827
  [5,24,0.7071,0,0.7071,0.7071,1,0.7071,0.3827,0,0.9239,0.9239,0,0.3827],
// 4 16 0.3827 1 0.9239 0 1 1 0 0 1 0.3827 0 0.9239
  [4,16,0.3827,1,0.9239,0,1,1,0,0,1,0.3827,0,0.9239],
// 5 24 0.3827 0 0.9239 0.3827 1 0.9239 0 0 1 0.7071 0 0.7071
  [5,24,0.3827,0,0.9239,0.3827,1,0.9239,0,0,1,0.7071,0,0.7071],
// 4 16 0 1 1 -0.3827 1 0.9239 -0.3827 0 0.9239 0 0 1
  [4,16,0,1,1,-0.3827,1,0.9239,-0.3827,0,0.9239,0,0,1],
// 5 24 0 0 1 0 1 1 -0.3827 0 0.9239 0.3827 0 0.9239
  [5,24,0,0,1,0,1,1,-0.3827,0,0.9239,0.3827,0,0.9239],
// 4 16 -0.3827 1 0.9239 -0.7071 1 0.7071 -0.7071 0 0.7071 -0.3827 0 0.9239
  [4,16,-0.3827,1,0.9239,-0.7071,1,0.7071,-0.7071,0,0.7071,-0.3827,0,0.9239],
// 5 24 -0.3827 0 0.9239 -0.3827 1 0.9239 -0.7071 0 0.7071 0 0 1
  [5,24,-0.3827,0,0.9239,-0.3827,1,0.9239,-0.7071,0,0.7071,0,0,1],
// 4 16 -0.7071 1 0.7071 -0.9239 1 0.3827 -0.9239 0 0.3827 -0.7071 0 0.7071
  [4,16,-0.7071,1,0.7071,-0.9239,1,0.3827,-0.9239,0,0.3827,-0.7071,0,0.7071],
// 5 24 -0.7071 0 0.7071 -0.7071 1 0.7071 -0.9239 0 0.3827 -0.3827 0 0.9239
  [5,24,-0.7071,0,0.7071,-0.7071,1,0.7071,-0.9239,0,0.3827,-0.3827,0,0.9239],
// 4 16 -0.9239 1 0.3827 -1 1 0 -1 0 0 -0.9239 0 0.3827
  [4,16,-0.9239,1,0.3827,-1,1,0,-1,0,0,-0.9239,0,0.3827],
// 5 24 -0.9239 0 0.3827 -0.9239 1 0.3827 -1 0 0 -0.7071 0 0.7071
  [5,24,-0.9239,0,0.3827,-0.9239,1,0.3827,-1,0,0,-0.7071,0,0.7071],
// 4 16 -1 1 0 -0.9239 1 -0.3827 -0.9239 0 -0.3827 -1 0 0
  [4,16,-1,1,0,-0.9239,1,-0.3827,-0.9239,0,-0.3827,-1,0,0],
// 5 24 -1 0 0 -1 1 0 -0.9239 0 -0.3827 -0.9239 0 0.3827
  [5,24,-1,0,0,-1,1,0,-0.9239,0,-0.3827,-0.9239,0,0.3827],
// 4 16 -0.9239 1 -0.3827 -0.7071 1 -0.7071 -0.7071 0 -0.7071 -0.9239 0 -0.3827
  [4,16,-0.9239,1,-0.3827,-0.7071,1,-0.7071,-0.7071,0,-0.7071,-0.9239,0,-0.3827],
// 5 24 -0.9239 0 -0.3827 -0.9239 1 -0.3827 -0.7071 0 -0.7071 -1 0 0
  [5,24,-0.9239,0,-0.3827,-0.9239,1,-0.3827,-0.7071,0,-0.7071,-1,0,0],
// 4 16 -0.7071 1 -0.7071 -0.3827 1 -0.9239 -0.3827 0 -0.9239 -0.7071 0 -0.7071
  [4,16,-0.7071,1,-0.7071,-0.3827,1,-0.9239,-0.3827,0,-0.9239,-0.7071,0,-0.7071],
// 5 24 -0.7071 0 -0.7071 -0.7071 1 -0.7071 -0.3827 0 -0.9239 -0.9239 0 -0.3827
  [5,24,-0.7071,0,-0.7071,-0.7071,1,-0.7071,-0.3827,0,-0.9239,-0.9239,0,-0.3827],
// 4 16 -0.3827 1 -0.9239 0 1 -1 0 0 -1 -0.3827 0 -0.9239
  [4,16,-0.3827,1,-0.9239,0,1,-1,0,0,-1,-0.3827,0,-0.9239],
// 5 24 -0.3827 0 -0.9239 -0.3827 1 -0.9239 0 0 -1 -0.7071 0 -0.7071
  [5,24,-0.3827,0,-0.9239,-0.3827,1,-0.9239,0,0,-1,-0.7071,0,-0.7071],
// 4 16 0 1 -1 0.3827 1 -0.9239 0.3827 0 -0.9239 0 0 -1
  [4,16,0,1,-1,0.3827,1,-0.9239,0.3827,0,-0.9239,0,0,-1],
// 5 24 0 0 -1 0 1 -1 0.3827 0 -0.9239 -0.3827 0 -0.9239
  [5,24,0,0,-1,0,1,-1,0.3827,0,-0.9239,-0.3827,0,-0.9239],
// 4 16 0.3827 1 -0.9239 0.7071 1 -0.7071 0.7071 0 -0.7071 0.3827 0 -0.9239
  [4,16,0.3827,1,-0.9239,0.7071,1,-0.7071,0.7071,0,-0.7071,0.3827,0,-0.9239],
// 5 24 0.3827 0 -0.9239 0.3827 1 -0.9239 0.7071 0 -0.7071 0 0 -1
  [5,24,0.3827,0,-0.9239,0.3827,1,-0.9239,0.7071,0,-0.7071,0,0,-1],
// 4 16 0.7071 1 -0.7071 0.9239 1 -0.3827 0.9239 0 -0.3827 0.7071 0 -0.7071
  [4,16,0.7071,1,-0.7071,0.9239,1,-0.3827,0.9239,0,-0.3827,0.7071,0,-0.7071],
// 5 24 0.7071 0 -0.7071 0.7071 1 -0.7071 0.9239 0 -0.3827 0.3827 0 -0.9239
  [5,24,0.7071,0,-0.7071,0.7071,1,-0.7071,0.9239,0,-0.3827,0.3827,0,-0.9239],
// 4 16 0.9239 1 -0.3827 1 1 0 1 0 0 0.9239 0 -0.3827
  [4,16,0.9239,1,-0.3827,1,1,0,1,0,0,0.9239,0,-0.3827],
// 5 24 0.9239 0 -0.3827 0.9239 1 -0.3827 1 0 0 0.7071 0 -0.7071
  [5,24,0.9239,0,-0.3827,0.9239,1,-0.3827,1,0,0,0.7071,0,-0.7071],
// 0
];
module ldraw_lib__4_4cyli(step=0, col=false, unit=2/5, alt=false, line=0.2, solid=!$preview)
    makepoly(ldraw_lib__4_4cyli(), step=step, col=col, unit=unit, alt=alt, line=line, solid=solid);
ldraw_lib__4_4cyli(line=0.2);
// main file
use <../lib.scad>
use <../p/4-4cyli.scad>
use <../p/4-4disc.scad>
use <../p/4-4edge.scad>
use <../p/4-4ring4.scad>
use <../p/4-4ring5.scad>
use <../p/4-4ring6.scad>
use <../p/4-4ring7.scad>
use <../p/axle.scad>
function ldraw_lib__u9011() = [
// 0 ~Technic Axle Flexible 26 Axle - 2L End
// 0 Name: u9011.dat
// 0 Author: Michael Heidemann [mikeheide]
// 0 !LDRAW_ORG Part UPDATE 2010-03
// 0 !LICENSE Licensed under CC BY 4.0 : see CAreadme.txt
// 
// 0 BFC CERTIFY CCW
  [0,"BFC","CERTIFY"],
  [0,"BFC","CCW"],
// 
// 0 !HISTORY 2010-12-31 [PTadmin] Official Update 2010-03
// 
// 
// 0 BFC INVERTNEXT
  [0,"BFC","INVERTNEXT"],
// 1 16 0 0 0 0 10 0 -3.5 0 0 0 0 3.5 4-4cyli.dat
  [1,16,0,0,0,0,10,0,-3.5,0,0,0,0,3.5, ldraw_lib__4_4cyli()],
// 1 16 0 0 0 0 1 0 -1 0 0 0 0 1 4-4ring5.dat
  [1,16,0,0,0,0,1,0,-1,0,0,0,0,1, ldraw_lib__4_4ring5()],
// 1 16 0 0 0 0 1 0 -1 0 0 0 0 1 4-4ring4.dat
  [1,16,0,0,0,0,1,0,-1,0,0,0,0,1, ldraw_lib__4_4ring4()],
// 1 16 0 0 0 0 1 0 -0.5 0 0 0 0 0.5 4-4ring7.dat
  [1,16,0,0,0,0,1,0,-0.5,0,0,0,0,0.5, ldraw_lib__4_4ring7()],
// 1 16 10 0 0 0 1 0 -3.5 0 0 0 0 3.5 4-4disc.dat
  [1,16,10,0,0,0,1,0,-3.5,0,0,0,0,3.5, ldraw_lib__4_4disc()],
// 1 16 15 0 0 0 1 0 -1 0 0 0 0 1 4-4ring6.dat
  [1,16,15,0,0,0,1,0,-1,0,0,0,0,1, ldraw_lib__4_4ring6()],
// 1 16 0 0 0 0 15 0 -6 0 0 0 0 6 4-4cyli.dat
  [1,16,0,0,0,0,15,0,-6,0,0,0,0,6, ldraw_lib__4_4cyli()],
// 1 16 15 0 0 0 5 0 -7 0 0 0 0 7 4-4cyli.dat
  [1,16,15,0,0,0,5,0,-7,0,0,0,0,7, ldraw_lib__4_4cyli()],
// 1 16 15 0 0 0 15 0 -7 0 0 0 0 7 4-4edge.dat
  [1,16,15,0,0,0,15,0,-7,0,0,0,0,7, ldraw_lib__4_4edge()],
// 1 16 20 0 0 0 15 0 -7 0 0 0 0 7 4-4edge.dat
  [1,16,20,0,0,0,15,0,-7,0,0,0,0,7, ldraw_lib__4_4edge()],
// 1 16 20 0 0 0 -15 0 -7 0 0 0 0 -7 4-4disc.dat
  [1,16,20,0,0,0,-15,0,-7,0,0,0,0,-7, ldraw_lib__4_4disc()],
// 1 16 0 0 0 0 15 0 -6 0 0 0 0 6 4-4edge.dat
  [1,16,0,0,0,0,15,0,-6,0,0,0,0,6, ldraw_lib__4_4edge()],
// 1 16 15 0 0 0 15 0 -6 0 0 0 0 6 4-4edge.dat
  [1,16,15,0,0,0,15,0,-6,0,0,0,0,6, ldraw_lib__4_4edge()],
// 1 16 0 0 0 0 1 0 -3.5 0 0 0 0 3.5 4-4edge.dat
  [1,16,0,0,0,0,1,0,-3.5,0,0,0,0,3.5, ldraw_lib__4_4edge()],
// 1 16 10 0 0 0 15 0 -3.5 0 0 0 0 3.5 4-4edge.dat
  [1,16,10,0,0,0,15,0,-3.5,0,0,0,0,3.5, ldraw_lib__4_4edge()],
// 1 16 20 0 0 0 40 0 -1 0 0 0 0 1 axle.dat
  [1,16,20,0,0,0,40,0,-1,0,0,0,0,1, ldraw_lib__axle()],
// 0
];
module ldraw_lib__u9011(step=0, col=false, unit=2/5, alt=false, line=0.2, solid=!$preview)
    makepoly(ldraw_lib__u9011(), step=step, col=col, unit=unit, alt=alt, line=line, solid=solid);
ldraw_lib__u9011(line=0.2);
